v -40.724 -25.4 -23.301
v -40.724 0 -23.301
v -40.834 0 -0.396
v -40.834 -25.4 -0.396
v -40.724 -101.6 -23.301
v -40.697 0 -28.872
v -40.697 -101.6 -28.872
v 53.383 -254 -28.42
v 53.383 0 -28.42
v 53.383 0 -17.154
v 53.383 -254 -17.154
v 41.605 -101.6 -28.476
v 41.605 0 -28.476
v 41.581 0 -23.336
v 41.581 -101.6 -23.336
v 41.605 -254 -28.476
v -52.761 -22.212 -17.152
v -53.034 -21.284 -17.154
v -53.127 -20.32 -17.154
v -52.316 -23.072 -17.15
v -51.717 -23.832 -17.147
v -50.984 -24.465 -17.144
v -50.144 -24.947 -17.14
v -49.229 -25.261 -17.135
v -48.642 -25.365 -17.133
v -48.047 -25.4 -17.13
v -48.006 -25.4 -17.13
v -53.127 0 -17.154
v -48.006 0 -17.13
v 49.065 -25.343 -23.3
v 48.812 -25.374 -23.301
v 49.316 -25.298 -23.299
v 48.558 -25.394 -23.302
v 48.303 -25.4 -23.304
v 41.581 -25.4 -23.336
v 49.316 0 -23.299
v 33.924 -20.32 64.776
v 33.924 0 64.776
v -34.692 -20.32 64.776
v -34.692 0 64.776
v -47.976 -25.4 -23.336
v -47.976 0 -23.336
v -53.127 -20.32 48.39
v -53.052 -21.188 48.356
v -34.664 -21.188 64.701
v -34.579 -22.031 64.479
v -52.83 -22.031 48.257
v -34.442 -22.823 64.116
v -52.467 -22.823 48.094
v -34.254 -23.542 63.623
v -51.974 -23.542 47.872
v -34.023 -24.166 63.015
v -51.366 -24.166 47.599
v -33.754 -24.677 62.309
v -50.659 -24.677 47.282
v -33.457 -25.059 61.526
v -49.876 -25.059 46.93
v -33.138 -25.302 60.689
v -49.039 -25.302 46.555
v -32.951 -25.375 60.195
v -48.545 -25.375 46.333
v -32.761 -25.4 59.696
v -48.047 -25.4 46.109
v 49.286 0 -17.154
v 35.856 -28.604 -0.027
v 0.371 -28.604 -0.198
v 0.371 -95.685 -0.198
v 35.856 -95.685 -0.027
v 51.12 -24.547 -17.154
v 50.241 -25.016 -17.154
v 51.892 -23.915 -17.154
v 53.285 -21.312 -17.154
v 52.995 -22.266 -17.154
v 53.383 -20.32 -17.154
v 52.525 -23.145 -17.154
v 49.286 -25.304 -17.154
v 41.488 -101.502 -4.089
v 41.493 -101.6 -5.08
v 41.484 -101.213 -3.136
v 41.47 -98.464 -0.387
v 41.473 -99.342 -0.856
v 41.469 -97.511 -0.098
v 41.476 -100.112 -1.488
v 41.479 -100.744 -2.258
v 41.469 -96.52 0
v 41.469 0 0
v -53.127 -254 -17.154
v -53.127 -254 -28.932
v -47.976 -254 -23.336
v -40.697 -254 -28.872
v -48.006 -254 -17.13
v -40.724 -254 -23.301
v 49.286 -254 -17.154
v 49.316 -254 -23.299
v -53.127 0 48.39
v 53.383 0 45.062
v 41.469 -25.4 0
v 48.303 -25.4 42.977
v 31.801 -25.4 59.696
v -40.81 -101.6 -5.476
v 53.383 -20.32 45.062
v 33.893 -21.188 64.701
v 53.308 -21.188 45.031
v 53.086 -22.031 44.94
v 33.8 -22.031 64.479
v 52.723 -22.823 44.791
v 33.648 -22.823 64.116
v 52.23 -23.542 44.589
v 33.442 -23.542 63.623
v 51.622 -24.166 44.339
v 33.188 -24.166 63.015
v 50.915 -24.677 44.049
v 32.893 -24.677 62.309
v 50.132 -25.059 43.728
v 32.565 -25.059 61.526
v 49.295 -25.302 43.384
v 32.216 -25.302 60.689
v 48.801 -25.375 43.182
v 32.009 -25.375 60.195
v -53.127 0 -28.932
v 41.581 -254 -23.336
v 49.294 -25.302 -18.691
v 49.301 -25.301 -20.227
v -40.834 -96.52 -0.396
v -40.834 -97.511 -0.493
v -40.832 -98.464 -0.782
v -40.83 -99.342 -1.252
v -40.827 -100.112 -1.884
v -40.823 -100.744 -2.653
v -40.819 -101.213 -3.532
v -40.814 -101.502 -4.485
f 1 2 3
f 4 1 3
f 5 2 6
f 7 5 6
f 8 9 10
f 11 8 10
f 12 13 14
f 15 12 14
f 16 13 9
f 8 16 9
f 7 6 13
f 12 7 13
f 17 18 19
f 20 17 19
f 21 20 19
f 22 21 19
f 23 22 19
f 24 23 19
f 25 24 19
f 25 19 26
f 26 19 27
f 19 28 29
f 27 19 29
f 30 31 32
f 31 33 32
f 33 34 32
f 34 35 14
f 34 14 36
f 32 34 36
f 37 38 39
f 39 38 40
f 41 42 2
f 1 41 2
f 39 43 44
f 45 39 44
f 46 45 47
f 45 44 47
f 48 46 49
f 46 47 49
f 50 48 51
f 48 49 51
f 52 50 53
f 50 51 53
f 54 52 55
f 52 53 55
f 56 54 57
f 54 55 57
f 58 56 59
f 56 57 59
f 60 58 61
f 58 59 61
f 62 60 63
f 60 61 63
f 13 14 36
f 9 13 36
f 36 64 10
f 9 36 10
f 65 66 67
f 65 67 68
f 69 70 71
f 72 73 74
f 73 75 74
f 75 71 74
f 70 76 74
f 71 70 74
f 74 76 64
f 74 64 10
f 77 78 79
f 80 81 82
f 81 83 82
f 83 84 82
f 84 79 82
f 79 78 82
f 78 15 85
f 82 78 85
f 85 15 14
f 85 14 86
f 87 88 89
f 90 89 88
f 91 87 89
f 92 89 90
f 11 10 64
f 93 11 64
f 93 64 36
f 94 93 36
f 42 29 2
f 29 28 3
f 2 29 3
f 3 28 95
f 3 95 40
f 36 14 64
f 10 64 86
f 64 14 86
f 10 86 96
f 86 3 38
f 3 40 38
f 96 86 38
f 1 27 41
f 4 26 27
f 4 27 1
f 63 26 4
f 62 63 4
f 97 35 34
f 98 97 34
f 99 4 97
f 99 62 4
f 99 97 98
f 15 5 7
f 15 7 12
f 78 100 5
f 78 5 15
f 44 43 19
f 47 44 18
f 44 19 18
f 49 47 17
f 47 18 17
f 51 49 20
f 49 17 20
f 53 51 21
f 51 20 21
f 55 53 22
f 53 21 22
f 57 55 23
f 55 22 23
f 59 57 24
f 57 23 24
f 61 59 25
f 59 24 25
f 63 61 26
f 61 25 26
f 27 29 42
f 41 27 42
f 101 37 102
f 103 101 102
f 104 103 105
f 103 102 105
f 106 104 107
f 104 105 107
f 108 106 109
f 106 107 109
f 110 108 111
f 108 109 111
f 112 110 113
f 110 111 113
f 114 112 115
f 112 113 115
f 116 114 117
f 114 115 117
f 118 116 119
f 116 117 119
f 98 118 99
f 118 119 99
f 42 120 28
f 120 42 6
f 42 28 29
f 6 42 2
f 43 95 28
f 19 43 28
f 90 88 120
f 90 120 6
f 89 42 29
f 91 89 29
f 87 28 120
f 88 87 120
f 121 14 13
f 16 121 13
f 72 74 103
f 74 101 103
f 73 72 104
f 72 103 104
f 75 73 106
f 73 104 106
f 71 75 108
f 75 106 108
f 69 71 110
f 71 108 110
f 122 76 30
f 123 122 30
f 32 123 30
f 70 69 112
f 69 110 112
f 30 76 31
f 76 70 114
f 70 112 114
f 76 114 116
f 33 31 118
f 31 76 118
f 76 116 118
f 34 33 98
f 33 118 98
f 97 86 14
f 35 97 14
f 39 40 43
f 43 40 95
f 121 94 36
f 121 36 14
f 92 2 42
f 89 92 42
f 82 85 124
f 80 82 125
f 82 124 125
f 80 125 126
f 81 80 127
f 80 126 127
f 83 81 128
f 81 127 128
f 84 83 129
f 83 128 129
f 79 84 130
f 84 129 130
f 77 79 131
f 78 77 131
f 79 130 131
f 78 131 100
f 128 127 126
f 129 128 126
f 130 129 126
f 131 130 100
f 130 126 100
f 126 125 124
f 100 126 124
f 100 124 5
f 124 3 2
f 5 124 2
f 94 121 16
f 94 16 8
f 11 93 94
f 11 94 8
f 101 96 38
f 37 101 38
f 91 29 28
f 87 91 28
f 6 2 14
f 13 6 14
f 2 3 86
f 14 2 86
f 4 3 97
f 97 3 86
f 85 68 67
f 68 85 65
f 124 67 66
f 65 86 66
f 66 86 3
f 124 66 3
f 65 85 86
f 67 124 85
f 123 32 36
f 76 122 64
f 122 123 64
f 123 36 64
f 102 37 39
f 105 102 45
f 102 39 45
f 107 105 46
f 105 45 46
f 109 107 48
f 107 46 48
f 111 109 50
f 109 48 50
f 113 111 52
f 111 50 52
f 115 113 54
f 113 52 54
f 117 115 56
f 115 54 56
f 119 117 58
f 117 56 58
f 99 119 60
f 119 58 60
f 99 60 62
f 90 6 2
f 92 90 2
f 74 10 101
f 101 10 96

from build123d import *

# Parameters (mm, degrees)
F1_DEPTH = 254
F2_DEPTH = 101.6
F3_DEPTH = 25.4
F5_R     = 5.08
F5_2_R   = 5.08
F4_W     = 70.421255
F4_H     = 67.080386
F6_DEPTH = 25.4


with BuildPart() as f1:
    # F0 (on Front) → F1 (new body)
    with BuildSketch(Plane.XZ):
        Polygon((-48.00612, -17.129526), (-53.126641, -17.154144), (-53.126641, -28.931618), (-40.697067, -28.87186), (-40.72385, -23.301091), (-47.976282, -23.335959), align=None)
        Polygon((53.382672, -28.419552), (53.382672, -17.154144), (49.286161, -17.154144), (49.315702, -23.298772), (41.58076, -23.335959), (41.605473, -28.476174), align=None)
    extrude(amount=F1_DEPTH)


with BuildPart() as f2:
    # F0 (on Front) → F2 (new body)
    with BuildSketch(Plane.XZ):
        Polygon((-40.72385, -23.301091), (-40.697067, -28.87186), (41.605473, -28.476174), (41.58076, -23.335959), (41.468568, 0), (-40.833972, -0.395686), align=None)
    extrude(amount=F2_DEPTH)

    # F5#2
    f5_2_edges = [f2.edges().sort_by_distance(p)[0] for p in [
        (0.317298, -101.6, -0.197843),
    ]]
    fillet(f5_2_edges, radius=F5_2_R)

    # F4 (on face) → F6 (join)
    with BuildSketch(Plane(origin=(0.000958, 0, -0.199364), x_dir=(0.999988, 0, 0.004808), z_dir=(-0.004808, 0, 0.999988))):
        with Locations((0.644948, -62.144656)):
            Rectangle(F4_W, F4_H)
    extrude(amount=-F6_DEPTH)


with BuildPart() as f3:
    # F0 (on Front) → F3 (new body)
    with BuildSketch(Plane.XZ):
        Polygon((33.924241, 64.776093), (-34.692336, 64.776093), (-53.126641, 48.390046), (-53.126641, -17.154144), (-48.00612, -17.129526), (-47.976282, -23.335959), (-40.72385, -23.301091), (-40.833972, -0.395686), (41.468568, 0), (41.58076, -23.335959), (49.315702, -23.298772), (49.286161, -17.154144), (53.382672, -17.154144), (53.382672, 45.061633), align=None)
    extrude(amount=F3_DEPTH)

    # F5
    f5_edges = [f3.edges().sort_by_distance(p)[0] for p in [
        (-43.909488, -25.4, 56.583069),
        (-0.384048, -25.4, 64.776093),
        (43.653456, -25.4, 54.918863),
        (53.382672, -25.4, 13.953744),
        (-53.126641, -25.4, 15.617951),
    ]]
    fillet(f5_edges, radius=F5_R)


solid = Compound([f1.part, f2.part, f3.part])
